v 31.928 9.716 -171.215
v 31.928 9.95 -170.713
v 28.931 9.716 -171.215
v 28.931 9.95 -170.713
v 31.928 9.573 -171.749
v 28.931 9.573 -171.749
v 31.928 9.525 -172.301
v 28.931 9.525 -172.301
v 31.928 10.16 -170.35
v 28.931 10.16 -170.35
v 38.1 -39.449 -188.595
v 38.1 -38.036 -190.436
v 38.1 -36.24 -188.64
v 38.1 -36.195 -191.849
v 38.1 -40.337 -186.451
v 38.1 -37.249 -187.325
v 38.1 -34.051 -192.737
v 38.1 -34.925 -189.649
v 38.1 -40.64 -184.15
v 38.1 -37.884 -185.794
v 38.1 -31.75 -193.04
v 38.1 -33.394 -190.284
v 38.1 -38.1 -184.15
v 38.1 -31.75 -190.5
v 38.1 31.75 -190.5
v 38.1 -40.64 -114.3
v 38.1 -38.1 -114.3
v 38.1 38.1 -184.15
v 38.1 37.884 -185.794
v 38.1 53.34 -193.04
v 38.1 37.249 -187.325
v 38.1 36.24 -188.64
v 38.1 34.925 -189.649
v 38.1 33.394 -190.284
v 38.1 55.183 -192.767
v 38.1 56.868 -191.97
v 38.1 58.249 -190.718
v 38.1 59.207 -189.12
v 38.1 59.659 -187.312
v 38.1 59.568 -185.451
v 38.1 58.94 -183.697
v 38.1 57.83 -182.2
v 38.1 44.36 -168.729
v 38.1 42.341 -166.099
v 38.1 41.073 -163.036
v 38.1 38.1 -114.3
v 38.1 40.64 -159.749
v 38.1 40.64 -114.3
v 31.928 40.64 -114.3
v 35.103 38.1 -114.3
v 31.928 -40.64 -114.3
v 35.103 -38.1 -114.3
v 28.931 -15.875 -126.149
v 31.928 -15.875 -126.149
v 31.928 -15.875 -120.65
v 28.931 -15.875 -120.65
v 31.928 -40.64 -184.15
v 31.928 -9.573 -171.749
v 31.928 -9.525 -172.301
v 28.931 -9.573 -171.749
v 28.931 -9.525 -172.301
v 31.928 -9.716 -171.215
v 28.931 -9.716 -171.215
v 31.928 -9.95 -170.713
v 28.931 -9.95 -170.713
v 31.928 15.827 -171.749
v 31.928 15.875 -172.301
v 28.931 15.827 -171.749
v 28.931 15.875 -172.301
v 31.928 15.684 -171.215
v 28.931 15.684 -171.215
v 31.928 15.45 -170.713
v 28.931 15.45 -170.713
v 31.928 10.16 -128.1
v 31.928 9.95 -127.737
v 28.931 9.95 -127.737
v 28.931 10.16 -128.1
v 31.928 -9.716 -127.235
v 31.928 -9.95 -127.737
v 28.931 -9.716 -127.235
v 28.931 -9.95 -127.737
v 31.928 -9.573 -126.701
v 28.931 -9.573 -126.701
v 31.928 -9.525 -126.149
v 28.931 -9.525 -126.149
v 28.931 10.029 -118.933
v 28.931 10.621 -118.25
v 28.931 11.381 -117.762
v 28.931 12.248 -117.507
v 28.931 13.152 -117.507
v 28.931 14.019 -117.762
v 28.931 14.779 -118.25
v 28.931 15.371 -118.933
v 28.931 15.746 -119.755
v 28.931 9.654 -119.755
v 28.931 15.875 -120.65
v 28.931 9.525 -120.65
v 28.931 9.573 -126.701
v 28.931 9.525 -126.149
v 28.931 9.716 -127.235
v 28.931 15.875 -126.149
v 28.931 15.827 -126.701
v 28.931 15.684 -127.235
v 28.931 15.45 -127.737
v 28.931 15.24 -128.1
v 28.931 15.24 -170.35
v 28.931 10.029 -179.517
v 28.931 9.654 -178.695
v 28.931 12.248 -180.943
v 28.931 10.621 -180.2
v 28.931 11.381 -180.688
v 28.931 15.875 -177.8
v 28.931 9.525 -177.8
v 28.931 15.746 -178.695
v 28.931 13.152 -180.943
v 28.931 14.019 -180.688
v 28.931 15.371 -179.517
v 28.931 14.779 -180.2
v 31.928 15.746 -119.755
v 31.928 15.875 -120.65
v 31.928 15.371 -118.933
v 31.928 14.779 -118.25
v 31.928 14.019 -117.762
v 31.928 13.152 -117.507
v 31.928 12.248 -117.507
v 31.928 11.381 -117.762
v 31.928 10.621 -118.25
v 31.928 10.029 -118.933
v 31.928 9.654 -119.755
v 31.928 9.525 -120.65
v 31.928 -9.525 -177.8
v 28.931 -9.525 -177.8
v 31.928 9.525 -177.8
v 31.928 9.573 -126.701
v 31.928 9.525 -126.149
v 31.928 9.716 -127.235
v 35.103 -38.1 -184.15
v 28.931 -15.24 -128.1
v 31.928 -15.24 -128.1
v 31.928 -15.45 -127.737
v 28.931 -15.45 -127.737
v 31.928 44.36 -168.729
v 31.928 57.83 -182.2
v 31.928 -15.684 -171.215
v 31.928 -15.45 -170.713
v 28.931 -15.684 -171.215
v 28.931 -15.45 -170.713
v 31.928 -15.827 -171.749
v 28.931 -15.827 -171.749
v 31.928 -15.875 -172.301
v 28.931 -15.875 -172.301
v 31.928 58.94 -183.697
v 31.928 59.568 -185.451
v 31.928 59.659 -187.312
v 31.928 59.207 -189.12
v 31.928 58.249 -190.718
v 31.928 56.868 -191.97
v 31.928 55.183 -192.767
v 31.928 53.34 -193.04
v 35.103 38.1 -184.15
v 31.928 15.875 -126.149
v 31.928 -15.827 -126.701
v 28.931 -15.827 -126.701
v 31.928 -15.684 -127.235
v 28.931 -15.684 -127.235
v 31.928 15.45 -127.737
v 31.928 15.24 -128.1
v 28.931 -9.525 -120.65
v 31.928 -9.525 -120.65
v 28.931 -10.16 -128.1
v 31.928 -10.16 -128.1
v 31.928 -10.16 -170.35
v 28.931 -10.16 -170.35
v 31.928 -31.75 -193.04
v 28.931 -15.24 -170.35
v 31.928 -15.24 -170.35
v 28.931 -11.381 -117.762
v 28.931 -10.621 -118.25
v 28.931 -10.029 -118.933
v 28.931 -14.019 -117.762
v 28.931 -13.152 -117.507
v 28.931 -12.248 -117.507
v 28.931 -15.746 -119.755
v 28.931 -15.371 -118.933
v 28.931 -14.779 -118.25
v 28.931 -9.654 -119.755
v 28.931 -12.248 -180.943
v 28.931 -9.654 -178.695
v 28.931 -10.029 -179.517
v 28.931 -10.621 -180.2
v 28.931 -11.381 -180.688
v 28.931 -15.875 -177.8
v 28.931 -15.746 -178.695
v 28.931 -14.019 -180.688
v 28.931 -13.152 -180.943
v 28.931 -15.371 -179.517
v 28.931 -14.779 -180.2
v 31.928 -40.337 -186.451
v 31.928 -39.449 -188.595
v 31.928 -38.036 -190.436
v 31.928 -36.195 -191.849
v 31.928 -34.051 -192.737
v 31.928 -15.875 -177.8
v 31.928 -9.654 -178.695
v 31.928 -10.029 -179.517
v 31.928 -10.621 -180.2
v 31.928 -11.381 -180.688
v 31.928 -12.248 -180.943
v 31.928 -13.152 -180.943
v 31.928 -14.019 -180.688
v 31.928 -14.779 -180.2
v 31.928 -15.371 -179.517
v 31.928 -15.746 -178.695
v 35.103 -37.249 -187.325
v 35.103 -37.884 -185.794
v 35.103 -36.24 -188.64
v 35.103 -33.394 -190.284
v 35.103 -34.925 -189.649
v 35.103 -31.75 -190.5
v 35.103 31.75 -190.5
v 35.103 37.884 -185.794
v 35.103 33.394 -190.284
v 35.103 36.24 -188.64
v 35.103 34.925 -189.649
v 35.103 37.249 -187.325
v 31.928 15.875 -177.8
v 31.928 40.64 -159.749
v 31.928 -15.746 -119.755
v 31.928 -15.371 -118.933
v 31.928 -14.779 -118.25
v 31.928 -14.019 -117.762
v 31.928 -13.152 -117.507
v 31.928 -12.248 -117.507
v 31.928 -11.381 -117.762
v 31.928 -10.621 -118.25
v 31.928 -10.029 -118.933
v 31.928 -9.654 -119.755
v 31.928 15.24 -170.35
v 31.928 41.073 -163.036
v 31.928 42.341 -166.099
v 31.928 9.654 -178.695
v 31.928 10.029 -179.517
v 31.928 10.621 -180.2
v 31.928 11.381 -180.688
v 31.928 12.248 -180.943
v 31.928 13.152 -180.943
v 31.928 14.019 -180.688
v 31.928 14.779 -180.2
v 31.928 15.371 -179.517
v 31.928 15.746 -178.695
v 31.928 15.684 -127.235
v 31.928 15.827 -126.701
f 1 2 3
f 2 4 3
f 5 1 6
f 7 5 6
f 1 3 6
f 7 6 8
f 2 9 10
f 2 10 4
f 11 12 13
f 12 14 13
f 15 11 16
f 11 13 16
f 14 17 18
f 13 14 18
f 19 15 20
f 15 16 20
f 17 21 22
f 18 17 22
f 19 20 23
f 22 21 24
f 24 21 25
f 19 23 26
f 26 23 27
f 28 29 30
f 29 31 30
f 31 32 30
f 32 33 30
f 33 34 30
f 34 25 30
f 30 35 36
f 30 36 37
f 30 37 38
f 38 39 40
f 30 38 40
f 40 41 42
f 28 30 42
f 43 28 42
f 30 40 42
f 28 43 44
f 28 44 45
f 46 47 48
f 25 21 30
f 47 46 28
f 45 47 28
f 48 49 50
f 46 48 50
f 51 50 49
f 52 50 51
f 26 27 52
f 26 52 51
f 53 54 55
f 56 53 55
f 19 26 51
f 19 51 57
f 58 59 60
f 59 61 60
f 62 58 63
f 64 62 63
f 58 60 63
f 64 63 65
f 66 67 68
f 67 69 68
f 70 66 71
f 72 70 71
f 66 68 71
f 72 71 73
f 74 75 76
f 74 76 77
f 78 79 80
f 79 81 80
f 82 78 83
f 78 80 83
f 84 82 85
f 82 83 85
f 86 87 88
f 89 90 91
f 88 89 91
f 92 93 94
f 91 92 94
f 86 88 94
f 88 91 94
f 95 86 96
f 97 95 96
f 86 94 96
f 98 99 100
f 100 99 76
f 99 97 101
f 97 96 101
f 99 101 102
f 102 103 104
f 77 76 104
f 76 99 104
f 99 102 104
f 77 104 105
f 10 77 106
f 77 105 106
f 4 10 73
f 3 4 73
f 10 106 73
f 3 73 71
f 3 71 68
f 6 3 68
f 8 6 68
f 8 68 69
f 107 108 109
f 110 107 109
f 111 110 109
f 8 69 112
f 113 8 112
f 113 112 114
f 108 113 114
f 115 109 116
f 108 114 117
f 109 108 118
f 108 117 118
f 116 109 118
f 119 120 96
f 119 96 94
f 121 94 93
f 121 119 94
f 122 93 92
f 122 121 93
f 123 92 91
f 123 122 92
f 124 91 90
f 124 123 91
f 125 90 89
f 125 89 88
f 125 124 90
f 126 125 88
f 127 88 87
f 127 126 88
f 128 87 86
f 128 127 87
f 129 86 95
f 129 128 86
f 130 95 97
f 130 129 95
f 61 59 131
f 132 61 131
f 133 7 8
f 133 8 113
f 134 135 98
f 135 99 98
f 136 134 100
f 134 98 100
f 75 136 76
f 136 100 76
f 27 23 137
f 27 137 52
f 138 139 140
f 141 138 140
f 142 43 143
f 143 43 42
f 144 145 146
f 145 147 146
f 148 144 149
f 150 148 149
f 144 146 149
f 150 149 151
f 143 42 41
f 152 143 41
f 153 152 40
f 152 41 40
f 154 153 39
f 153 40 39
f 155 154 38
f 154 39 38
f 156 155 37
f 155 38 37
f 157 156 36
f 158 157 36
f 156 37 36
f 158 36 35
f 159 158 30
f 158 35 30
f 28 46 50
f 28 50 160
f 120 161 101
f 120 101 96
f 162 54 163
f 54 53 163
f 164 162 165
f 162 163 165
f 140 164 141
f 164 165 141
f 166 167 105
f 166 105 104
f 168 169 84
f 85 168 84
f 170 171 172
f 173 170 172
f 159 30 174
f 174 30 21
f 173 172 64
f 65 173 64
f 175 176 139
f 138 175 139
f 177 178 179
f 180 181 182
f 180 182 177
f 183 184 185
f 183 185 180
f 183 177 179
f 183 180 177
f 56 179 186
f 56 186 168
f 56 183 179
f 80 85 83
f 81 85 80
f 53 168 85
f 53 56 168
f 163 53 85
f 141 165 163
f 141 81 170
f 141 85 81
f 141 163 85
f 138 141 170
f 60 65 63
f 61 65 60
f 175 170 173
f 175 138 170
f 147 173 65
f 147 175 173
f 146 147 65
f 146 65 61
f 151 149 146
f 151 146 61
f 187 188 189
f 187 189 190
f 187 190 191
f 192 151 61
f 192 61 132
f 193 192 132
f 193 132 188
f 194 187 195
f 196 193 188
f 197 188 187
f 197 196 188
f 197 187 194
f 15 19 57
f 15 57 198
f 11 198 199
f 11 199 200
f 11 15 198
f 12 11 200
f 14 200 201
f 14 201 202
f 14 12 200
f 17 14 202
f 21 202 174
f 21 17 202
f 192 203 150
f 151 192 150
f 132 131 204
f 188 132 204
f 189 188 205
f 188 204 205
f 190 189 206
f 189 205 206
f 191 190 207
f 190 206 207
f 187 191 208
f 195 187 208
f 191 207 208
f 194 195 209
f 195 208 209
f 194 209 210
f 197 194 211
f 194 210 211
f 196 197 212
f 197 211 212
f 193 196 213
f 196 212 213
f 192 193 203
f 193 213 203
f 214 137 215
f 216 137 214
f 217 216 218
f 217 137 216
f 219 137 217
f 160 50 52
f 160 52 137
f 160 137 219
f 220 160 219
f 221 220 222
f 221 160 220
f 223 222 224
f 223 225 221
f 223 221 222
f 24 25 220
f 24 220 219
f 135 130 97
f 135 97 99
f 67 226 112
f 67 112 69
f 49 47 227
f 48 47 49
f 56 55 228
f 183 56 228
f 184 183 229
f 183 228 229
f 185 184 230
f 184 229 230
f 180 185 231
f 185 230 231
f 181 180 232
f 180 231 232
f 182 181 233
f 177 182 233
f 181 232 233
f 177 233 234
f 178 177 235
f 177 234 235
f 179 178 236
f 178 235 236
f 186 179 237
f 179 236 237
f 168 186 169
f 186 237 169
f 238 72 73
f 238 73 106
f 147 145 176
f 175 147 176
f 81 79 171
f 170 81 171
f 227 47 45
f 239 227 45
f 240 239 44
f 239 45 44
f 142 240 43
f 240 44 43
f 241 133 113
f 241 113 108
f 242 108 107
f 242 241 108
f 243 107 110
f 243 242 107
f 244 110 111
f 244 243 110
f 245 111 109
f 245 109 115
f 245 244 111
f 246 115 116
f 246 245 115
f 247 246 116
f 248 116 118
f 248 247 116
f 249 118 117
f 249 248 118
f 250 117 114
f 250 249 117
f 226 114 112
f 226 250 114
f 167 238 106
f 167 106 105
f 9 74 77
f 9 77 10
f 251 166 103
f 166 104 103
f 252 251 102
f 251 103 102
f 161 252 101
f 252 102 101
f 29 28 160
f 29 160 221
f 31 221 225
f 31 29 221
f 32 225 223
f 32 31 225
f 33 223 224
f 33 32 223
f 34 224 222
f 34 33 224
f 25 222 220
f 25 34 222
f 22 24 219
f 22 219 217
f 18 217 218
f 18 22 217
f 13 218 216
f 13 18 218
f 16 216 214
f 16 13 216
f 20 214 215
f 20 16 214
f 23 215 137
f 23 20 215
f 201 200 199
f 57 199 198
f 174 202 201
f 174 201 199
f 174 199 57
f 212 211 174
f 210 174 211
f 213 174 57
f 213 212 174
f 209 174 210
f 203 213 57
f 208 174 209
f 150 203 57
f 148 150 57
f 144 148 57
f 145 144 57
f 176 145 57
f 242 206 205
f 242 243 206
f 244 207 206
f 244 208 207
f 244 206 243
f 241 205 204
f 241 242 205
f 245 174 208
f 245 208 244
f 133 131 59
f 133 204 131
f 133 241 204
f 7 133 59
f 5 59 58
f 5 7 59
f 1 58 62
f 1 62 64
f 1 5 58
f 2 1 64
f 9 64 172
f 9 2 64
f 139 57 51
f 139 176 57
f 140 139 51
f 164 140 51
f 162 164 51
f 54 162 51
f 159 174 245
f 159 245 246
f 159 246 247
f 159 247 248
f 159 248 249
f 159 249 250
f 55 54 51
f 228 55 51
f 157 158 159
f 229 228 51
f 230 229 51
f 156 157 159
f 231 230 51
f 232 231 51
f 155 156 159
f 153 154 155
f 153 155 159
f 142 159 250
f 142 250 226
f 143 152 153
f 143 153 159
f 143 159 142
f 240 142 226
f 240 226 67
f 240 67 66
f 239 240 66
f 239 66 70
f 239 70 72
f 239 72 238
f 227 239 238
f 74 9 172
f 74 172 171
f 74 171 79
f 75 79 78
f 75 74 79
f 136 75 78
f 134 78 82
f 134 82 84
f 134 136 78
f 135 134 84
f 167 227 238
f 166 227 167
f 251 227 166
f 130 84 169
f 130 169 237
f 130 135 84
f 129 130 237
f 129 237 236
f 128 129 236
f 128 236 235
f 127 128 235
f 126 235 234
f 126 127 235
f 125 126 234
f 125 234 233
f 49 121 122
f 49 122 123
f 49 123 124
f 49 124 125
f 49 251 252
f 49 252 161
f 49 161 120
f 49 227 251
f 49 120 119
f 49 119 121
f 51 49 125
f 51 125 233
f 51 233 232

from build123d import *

# Parameters (mm, degrees)
BOSS_EXTRUDE1_DEPTH  = 3.175
EXTRUDE_THIN1_START  = -6.1722
EXTRUDE_THIN1_DEPTH  = 6.1722
BOSS_EXTRUDE2_DEPTH  = 2.9972
FILLET1_R            = 3.175
FILLET1_OF_MIRROR1_R = 3.175
BOSS_EXTRUDE3_START  = -6.1722
BOSS_EXTRUDE3_DEPTH  = 6.1722


with BuildPart() as part:
    # Sketch1 → Boss-Extrude1 (new body)
    with BuildSketch(Plane.ZY.offset(-35.1028)):
        with BuildLine():
            Line((-114.3, 38.1), (-114.3, -38.1))
            Line((-114.3, -38.1), (-184.15, -38.1))
            ThreePointArc((-184.15, -38.1), (-188.640128061, -36.240128061), (-190.5, -31.75))
            Line((-190.5, -31.75), (-190.5, 31.75))
            ThreePointArc((-190.5, 31.75), (-188.640128061, 36.240128061), (-184.15, 38.1))
            Line((-184.15, 38.1), (-114.3, 38.1))
        make_face()
    extrude(amount=BOSS_EXTRUDE1_DEPTH)

    # Sketch4 → Extrude-Thin1 (add)
    with BuildSketch(Plane.ZY.offset(-31.9278).offset(EXTRUDE_THIN1_START)):
        with BuildLine():
            Line((-114.3, 38.1), (-184.15, 38.1))
            ThreePointArc((-184.15, 38.1), (-188.640128061, 36.240128061), (-190.5, 31.75))
            Line((-190.5, 31.75), (-190.5, -31.75))
            ThreePointArc((-190.5, -31.75), (-188.640128061, -36.240128061), (-184.15, -38.1))
            Line((-184.15, -38.1), (-114.3, -38.1))
            Line((-114.3, -38.1), (-114.3, -40.64))
            Line((-114.3, -40.64), (-184.15, -40.64))
            ThreePointArc((-184.15, -40.64), (-190.436179285, -38.036179285), (-193.04, -31.75))
            Line((-193.04, -31.75), (-193.04, 31.75))
            ThreePointArc((-193.04, 31.75), (-190.436179285, 38.036179285), (-184.15, 40.64))
            Line((-184.15, 40.64), (-114.3, 40.64))
            Line((-114.3, 40.64), (-114.3, 38.1))
        make_face()
    extrude(amount=EXTRUDE_THIN1_DEPTH)

    # Sketch5 → Boss-Extrude2 (add)
    with BuildSketch(Plane.ZY.offset(-31.9278)):
        with BuildLine():
            Line((-177.8, 15.875), (-171.45, 15.875))
            Line((-171.45, 15.875), (-170.350147737, 15.24))
            Line((-170.350147737, 15.24), (-128.099852263, 15.24))
            Line((-128.099852263, 15.24), (-127, 15.875))
            Line((-127, 15.875), (-120.65, 15.875))
            ThreePointArc((-120.65, 15.875), (-117.475, 12.7), (-120.65, 9.525))
            Line((-120.65, 9.525), (-127, 9.525))
            Line((-127, 9.525), (-128.099852263, 10.16))
            Line((-128.099852263, 10.16), (-170.350147737, 10.16))
            Line((-170.350147737, 10.16), (-171.45, 9.525))
            Line((-171.45, 9.525), (-177.8, 9.525))
            ThreePointArc((-177.8, 9.525), (-180.975, 12.7), (-177.8, 15.875))
        make_face()
    boss_extrude2 = extrude(amount=BOSS_EXTRUDE2_DEPTH)

    # Fillet1
    fillet1_edges = [part.edges().sort_by_distance(p)[0] for p in [
        (30.4292, 15.875, -171.45),
        (30.4292, 9.525, -171.45),
        (30.4292, 9.525, -127),
        (30.4292, 15.875, -127),
    ]]
    fillet(fillet1_edges, radius=FILLET1_R)

    # Mirror1: Boss-Extrude2 across plane
    add(boss_extrude2.mirror(Plane.ZX))

    # Fillet1 of Mirror1
    fillet1_of_mirror1_edges = [part.edges().sort_by_distance(p)[0] for p in [
        (30.4292, -15.875, -171.45),
        (30.4292, -9.525, -171.45),
        (30.4292, -9.525, -127),
        (30.4292, -15.875, -127),
    ]]
    fillet(fillet1_of_mirror1_edges, radius=FILLET1_OF_MIRROR1_R)

    # Sketch6 → Boss-Extrude3 (add)
    with BuildSketch(Plane.ZY.offset(-31.9278).offset(BOSS_EXTRUDE3_START)):
        with BuildLine():
            Line((-193.04, 53.34), (-193.04, 31.75))
            ThreePointArc((-193.04, 31.75), (-190.436179285, 38.036179285), (-184.15, 40.64))
            Line((-184.15, 40.64), (-159.749231637, 40.64))
            ThreePointArc((-159.749231637, 40.64), (-164.609311228, 41.606729937), (-168.729487758, 44.359743879))
            Line((-168.729487758, 44.359743879), (-182.199871939, 57.830128061))
            ThreePointArc((-182.199871939, 57.830128061), (-189.120039796, 59.206635031), (-193.04, 53.34))
        make_face()
    extrude(amount=BOSS_EXTRUDE3_DEPTH)


solid = part.part
